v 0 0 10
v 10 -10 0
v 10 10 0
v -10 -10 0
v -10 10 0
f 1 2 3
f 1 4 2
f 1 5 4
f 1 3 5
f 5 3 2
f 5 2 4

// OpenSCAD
polyhedron(
  points=[ [10,10,0],[10,-10,0],[-10,-10,0],[-10,10,0], // the four points at base
           [0,0,10]  ],                                 // the apex point 
  faces=[ [0,1,4],[1,2,4],[2,3,4],[3,0,4],              // each triangle side
              [1,0,3],[2,1,3] ]                         // two triangles for square base
 );
